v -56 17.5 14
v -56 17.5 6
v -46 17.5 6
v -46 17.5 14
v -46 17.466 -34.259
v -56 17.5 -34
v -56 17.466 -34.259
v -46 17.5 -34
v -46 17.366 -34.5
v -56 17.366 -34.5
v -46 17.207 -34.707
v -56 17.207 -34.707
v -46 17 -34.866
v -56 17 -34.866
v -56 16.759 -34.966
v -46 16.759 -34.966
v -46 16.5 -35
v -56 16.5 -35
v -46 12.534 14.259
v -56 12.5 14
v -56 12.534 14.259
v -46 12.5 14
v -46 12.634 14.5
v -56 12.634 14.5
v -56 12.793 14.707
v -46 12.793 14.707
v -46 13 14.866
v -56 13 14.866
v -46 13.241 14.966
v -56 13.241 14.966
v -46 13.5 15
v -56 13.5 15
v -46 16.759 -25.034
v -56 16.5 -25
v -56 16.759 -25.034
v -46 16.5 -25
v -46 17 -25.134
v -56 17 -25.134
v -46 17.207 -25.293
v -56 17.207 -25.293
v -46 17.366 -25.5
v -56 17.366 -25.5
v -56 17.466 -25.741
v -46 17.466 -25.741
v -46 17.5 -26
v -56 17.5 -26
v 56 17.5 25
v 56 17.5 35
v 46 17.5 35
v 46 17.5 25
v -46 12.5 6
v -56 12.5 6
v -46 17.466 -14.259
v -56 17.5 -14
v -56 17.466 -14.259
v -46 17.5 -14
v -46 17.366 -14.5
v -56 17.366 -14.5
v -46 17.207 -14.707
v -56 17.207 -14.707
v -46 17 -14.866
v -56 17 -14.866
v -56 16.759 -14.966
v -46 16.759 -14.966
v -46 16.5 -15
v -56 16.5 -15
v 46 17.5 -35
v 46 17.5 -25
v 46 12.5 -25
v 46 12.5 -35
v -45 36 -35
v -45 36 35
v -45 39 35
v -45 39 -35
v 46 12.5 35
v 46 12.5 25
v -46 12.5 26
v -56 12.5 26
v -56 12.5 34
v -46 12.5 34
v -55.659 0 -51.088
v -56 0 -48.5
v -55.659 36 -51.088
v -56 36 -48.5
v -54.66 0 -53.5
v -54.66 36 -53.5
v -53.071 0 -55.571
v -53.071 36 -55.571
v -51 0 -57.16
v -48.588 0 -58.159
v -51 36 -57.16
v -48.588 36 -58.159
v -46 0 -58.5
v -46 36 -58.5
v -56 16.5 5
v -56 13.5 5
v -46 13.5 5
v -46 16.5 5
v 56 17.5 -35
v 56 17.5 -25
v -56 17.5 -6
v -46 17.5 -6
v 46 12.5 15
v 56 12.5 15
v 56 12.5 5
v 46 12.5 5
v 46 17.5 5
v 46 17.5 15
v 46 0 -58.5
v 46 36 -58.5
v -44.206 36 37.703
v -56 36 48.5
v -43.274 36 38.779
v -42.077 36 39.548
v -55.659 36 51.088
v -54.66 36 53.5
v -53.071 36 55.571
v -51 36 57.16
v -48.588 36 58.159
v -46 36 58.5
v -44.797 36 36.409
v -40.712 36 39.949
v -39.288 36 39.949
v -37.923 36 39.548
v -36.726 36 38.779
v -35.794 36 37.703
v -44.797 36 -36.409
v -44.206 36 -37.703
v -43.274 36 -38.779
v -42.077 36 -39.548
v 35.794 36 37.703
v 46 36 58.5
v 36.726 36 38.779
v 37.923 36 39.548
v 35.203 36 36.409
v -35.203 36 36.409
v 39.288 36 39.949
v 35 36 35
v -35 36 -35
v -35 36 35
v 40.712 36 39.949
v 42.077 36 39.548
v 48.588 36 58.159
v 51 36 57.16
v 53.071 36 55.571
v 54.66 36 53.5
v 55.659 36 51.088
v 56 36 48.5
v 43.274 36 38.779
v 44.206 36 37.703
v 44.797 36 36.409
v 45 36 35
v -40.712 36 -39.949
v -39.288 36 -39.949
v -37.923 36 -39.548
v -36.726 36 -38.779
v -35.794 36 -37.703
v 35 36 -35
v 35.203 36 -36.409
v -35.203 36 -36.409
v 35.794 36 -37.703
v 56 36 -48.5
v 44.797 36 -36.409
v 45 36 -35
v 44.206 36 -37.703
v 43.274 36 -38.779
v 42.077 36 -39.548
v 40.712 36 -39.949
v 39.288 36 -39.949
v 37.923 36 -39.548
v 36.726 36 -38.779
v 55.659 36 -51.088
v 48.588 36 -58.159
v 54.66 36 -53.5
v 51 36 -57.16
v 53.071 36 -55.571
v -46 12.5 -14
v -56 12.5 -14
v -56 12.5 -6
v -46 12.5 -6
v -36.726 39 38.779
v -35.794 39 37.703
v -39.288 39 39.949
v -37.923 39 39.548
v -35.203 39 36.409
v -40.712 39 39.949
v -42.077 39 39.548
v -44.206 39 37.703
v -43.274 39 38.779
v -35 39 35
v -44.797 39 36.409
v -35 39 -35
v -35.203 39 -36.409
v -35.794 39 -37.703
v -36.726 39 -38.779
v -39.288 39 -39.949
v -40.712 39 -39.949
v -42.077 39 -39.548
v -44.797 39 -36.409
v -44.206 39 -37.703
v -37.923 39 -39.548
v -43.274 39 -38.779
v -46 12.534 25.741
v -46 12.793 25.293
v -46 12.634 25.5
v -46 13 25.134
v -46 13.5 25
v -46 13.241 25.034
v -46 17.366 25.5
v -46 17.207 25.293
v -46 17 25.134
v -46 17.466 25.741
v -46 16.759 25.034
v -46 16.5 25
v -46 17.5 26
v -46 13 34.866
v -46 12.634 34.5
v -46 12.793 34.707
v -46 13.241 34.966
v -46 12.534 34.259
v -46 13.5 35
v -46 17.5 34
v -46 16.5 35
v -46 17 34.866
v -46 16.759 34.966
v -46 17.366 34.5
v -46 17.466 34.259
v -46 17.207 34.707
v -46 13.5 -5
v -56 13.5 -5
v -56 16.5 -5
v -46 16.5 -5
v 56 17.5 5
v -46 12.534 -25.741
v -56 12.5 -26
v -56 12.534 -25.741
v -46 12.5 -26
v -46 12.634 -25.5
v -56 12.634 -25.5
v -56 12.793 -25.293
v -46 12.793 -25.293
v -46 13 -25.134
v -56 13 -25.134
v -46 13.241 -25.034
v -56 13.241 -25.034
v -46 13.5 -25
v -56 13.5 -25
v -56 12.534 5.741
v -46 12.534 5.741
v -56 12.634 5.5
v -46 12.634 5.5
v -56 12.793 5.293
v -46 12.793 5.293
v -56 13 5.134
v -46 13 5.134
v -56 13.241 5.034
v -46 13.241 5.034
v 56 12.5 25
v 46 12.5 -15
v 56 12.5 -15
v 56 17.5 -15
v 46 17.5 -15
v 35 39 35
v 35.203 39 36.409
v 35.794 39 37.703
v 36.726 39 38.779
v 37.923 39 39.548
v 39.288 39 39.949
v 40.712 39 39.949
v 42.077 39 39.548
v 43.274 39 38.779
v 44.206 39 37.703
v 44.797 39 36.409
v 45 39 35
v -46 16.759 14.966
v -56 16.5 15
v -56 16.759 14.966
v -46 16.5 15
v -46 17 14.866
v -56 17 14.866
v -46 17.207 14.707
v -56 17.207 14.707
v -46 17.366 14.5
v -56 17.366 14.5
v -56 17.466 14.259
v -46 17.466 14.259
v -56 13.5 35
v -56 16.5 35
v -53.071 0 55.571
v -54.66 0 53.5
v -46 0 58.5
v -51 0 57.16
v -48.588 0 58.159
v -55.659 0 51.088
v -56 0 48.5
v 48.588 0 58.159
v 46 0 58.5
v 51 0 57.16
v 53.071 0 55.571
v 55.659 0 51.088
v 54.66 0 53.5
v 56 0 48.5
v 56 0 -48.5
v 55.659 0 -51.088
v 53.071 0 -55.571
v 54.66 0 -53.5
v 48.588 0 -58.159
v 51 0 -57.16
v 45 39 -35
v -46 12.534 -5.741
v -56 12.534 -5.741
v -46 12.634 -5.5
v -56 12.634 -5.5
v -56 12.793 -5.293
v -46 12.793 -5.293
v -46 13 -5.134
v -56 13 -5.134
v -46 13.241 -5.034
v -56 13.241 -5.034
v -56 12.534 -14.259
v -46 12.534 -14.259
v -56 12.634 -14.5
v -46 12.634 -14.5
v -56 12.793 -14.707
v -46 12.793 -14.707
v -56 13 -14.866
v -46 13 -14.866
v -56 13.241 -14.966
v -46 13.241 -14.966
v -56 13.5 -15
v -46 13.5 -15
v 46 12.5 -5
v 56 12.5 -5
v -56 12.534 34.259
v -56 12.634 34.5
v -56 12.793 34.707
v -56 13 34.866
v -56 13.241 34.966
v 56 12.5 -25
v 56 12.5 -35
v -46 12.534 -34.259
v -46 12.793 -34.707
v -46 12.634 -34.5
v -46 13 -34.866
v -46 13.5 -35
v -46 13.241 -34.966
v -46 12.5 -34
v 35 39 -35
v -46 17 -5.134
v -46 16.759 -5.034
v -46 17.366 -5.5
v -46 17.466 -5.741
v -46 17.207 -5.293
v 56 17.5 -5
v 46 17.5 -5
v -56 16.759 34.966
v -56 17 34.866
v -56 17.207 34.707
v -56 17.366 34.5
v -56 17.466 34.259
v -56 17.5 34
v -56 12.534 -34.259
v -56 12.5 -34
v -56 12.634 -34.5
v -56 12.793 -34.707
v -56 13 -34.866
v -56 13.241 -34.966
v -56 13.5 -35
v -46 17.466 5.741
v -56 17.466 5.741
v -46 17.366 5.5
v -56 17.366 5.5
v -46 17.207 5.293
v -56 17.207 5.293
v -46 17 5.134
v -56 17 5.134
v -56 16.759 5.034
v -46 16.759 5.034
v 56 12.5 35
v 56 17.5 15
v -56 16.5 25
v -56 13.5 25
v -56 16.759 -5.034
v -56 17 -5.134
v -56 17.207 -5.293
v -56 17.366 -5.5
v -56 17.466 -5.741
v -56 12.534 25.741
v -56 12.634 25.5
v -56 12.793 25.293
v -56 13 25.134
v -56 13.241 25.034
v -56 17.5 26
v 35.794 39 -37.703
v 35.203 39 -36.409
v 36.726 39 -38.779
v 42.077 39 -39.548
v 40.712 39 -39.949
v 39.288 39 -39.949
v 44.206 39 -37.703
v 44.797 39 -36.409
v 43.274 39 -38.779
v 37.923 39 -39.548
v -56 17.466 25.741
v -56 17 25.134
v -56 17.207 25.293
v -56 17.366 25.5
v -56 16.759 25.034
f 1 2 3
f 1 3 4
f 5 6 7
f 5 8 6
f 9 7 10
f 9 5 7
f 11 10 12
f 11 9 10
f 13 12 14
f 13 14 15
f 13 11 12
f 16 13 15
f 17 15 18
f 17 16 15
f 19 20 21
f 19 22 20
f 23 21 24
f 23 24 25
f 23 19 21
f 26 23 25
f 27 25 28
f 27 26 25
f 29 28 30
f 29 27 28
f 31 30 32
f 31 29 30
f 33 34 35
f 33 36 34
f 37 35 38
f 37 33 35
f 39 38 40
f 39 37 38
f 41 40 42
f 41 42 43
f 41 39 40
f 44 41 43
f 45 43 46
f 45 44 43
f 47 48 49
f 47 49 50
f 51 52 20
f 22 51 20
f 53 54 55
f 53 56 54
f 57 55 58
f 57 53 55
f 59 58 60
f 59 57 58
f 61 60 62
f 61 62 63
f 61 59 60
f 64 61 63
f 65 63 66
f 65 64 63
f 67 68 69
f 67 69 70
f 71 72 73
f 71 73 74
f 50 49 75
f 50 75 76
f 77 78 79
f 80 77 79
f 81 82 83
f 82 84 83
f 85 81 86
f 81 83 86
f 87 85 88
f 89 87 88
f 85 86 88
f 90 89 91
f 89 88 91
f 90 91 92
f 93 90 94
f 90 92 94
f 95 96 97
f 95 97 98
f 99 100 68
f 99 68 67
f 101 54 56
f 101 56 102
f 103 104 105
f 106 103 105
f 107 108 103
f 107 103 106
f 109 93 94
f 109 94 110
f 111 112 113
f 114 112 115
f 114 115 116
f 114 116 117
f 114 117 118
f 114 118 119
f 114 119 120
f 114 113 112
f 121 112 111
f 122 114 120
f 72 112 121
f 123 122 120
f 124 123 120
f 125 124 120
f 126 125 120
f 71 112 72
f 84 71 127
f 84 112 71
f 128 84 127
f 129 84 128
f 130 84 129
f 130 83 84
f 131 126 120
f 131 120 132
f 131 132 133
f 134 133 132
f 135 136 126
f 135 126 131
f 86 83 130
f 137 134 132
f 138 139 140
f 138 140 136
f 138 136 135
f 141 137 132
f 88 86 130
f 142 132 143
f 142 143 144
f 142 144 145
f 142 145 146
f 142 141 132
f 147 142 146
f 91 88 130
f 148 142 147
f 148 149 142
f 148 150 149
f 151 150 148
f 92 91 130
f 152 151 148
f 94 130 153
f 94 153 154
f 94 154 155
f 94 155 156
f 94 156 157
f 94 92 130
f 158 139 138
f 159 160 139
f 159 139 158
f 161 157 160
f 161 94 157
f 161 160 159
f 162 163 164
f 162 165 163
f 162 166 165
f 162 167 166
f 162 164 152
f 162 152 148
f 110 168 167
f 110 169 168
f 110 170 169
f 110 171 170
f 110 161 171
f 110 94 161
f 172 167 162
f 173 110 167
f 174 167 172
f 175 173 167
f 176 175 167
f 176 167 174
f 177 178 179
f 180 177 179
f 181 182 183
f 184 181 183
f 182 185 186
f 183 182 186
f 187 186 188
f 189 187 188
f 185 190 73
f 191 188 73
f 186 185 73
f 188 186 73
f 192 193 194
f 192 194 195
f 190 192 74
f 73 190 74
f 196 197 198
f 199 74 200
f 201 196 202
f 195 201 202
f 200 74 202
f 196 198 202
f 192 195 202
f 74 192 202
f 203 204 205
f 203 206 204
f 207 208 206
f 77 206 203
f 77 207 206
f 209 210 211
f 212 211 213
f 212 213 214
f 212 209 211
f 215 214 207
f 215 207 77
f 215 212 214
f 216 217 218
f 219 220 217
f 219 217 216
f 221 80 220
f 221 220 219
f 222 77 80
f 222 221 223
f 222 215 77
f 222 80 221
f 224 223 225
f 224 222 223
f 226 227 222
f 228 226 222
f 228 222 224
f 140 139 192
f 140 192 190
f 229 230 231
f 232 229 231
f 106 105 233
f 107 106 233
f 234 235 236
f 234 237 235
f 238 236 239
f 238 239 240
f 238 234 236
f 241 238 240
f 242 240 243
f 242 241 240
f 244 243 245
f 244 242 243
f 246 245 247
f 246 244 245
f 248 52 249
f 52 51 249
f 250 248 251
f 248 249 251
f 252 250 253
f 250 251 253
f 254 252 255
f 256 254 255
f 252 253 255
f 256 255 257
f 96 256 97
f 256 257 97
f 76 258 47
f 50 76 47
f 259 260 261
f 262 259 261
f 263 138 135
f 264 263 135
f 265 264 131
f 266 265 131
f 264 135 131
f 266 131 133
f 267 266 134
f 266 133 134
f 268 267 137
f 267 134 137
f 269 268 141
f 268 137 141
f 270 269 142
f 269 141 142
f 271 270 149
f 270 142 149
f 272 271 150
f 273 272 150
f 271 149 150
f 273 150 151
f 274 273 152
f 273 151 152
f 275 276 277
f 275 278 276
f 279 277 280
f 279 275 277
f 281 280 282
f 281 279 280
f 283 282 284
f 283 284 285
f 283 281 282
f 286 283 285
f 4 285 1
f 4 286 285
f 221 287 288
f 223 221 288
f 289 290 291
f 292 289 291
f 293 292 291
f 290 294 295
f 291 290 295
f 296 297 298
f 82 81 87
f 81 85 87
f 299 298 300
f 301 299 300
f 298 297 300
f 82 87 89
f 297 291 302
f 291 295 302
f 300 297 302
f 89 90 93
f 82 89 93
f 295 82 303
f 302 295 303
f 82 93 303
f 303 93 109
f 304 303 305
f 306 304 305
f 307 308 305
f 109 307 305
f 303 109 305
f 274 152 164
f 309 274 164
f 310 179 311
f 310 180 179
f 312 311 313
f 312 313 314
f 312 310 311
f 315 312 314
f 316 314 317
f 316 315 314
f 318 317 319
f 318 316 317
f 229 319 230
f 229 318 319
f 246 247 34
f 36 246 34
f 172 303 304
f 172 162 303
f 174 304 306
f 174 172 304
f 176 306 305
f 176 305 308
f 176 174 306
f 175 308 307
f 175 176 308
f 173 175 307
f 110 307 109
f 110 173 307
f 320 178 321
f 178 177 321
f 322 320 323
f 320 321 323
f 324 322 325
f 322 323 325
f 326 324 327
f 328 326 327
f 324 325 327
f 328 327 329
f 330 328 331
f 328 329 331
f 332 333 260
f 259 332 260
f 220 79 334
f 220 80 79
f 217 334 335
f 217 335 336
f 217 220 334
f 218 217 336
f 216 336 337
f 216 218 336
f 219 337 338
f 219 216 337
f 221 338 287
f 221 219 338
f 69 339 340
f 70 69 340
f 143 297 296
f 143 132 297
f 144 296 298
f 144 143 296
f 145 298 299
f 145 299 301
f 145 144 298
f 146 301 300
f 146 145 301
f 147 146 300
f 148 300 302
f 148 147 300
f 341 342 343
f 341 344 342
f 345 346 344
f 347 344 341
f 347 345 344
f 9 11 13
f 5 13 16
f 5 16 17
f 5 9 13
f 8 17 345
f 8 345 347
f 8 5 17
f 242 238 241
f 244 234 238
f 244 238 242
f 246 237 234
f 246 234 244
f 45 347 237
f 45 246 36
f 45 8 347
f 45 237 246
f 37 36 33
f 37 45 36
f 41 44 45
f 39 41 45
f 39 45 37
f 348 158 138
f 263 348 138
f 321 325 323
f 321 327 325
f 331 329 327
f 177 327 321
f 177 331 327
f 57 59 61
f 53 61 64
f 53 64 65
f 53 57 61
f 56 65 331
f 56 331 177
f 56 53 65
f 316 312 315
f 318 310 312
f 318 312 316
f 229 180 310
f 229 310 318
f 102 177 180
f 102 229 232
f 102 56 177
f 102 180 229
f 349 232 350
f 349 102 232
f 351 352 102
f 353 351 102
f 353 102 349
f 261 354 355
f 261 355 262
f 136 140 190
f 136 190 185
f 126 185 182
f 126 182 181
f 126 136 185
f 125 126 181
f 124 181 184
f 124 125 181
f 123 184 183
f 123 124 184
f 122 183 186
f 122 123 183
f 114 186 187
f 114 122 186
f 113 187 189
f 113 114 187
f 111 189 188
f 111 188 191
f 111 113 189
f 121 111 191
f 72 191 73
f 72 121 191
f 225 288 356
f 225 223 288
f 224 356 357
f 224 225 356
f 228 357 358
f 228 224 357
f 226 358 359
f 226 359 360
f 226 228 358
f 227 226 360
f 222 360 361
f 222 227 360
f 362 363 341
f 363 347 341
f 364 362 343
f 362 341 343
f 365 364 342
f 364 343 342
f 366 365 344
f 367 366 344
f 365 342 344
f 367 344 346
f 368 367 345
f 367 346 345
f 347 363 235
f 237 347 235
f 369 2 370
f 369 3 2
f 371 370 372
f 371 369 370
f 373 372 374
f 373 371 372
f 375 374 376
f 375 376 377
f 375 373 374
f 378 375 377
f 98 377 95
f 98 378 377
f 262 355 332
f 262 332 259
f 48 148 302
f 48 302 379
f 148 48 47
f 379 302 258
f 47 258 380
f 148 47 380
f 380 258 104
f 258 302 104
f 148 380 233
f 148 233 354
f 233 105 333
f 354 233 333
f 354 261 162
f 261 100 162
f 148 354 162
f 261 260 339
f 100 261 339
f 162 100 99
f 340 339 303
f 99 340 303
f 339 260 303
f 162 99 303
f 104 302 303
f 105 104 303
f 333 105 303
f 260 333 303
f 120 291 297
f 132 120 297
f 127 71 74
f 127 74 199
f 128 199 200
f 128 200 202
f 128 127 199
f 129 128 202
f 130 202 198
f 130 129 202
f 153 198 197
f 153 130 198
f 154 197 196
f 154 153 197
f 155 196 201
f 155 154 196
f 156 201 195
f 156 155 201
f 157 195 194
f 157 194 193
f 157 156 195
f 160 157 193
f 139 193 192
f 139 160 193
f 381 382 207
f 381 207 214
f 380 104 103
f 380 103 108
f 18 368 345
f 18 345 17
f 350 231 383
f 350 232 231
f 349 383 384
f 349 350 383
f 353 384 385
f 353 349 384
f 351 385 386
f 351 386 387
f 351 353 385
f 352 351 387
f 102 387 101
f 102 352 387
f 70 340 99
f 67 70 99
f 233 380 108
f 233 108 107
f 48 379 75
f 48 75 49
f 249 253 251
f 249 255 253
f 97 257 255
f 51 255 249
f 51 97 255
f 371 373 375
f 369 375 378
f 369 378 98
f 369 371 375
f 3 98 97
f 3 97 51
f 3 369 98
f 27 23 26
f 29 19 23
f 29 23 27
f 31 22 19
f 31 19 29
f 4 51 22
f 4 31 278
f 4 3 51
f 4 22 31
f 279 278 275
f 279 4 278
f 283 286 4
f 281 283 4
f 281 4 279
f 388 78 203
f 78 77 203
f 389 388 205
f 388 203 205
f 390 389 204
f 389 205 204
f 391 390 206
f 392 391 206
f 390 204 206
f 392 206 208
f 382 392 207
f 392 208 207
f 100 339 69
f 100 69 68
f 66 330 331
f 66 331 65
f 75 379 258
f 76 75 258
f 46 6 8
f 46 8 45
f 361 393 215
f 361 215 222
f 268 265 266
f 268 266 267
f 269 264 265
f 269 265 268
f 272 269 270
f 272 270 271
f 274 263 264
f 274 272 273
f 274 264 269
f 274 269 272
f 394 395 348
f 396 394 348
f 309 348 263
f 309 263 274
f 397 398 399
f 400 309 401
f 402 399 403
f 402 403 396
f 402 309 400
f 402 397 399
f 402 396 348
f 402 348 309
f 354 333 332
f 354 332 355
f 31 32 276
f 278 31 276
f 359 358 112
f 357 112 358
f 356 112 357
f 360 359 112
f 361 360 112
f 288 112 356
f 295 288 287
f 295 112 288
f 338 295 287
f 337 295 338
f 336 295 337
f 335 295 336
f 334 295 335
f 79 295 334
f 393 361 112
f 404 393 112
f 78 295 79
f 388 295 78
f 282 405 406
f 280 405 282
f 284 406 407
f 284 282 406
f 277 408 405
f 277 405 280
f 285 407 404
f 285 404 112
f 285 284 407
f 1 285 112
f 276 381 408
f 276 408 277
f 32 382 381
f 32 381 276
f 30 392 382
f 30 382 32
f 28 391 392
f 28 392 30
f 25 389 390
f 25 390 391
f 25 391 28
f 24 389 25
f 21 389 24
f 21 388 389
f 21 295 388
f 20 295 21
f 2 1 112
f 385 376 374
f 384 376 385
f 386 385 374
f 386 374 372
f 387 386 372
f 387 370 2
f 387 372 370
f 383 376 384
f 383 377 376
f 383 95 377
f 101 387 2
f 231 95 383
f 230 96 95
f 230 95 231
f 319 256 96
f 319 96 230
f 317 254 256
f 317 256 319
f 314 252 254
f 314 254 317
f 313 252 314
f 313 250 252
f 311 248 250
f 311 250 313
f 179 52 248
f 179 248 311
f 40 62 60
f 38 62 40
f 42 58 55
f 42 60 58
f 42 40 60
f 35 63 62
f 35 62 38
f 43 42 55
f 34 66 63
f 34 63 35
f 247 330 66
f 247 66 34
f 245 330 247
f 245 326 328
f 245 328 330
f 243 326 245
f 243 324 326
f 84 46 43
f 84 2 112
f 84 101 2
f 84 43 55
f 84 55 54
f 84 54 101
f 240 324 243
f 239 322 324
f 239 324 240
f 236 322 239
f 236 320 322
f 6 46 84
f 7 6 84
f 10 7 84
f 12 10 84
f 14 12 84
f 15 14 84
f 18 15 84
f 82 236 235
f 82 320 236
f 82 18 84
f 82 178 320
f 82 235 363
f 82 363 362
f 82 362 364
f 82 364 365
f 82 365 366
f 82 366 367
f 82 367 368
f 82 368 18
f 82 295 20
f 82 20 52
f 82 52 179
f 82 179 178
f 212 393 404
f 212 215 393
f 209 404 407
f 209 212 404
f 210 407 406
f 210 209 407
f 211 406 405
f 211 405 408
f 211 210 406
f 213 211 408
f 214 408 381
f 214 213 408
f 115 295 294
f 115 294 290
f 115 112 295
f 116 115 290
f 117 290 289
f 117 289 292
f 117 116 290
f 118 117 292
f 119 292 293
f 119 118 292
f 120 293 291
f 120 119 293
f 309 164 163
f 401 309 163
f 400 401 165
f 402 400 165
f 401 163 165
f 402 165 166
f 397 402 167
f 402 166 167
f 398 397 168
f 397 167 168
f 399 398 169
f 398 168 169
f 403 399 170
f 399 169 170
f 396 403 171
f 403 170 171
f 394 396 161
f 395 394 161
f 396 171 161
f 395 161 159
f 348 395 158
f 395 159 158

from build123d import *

# Parameters (mm, degrees)
SKETCH_1_W          = 112
SKETCH_1_H          = 117
EXTRUDE_1_DEPTH     = 36
FILLET_1_R          = 10
EXTRUDE_2_DEPTH     = 3
SKETCH_4_W          = 10
SKETCH_4_H          = 5
CUT_EXTRUDE_1_DEPTH = 10
FILLET_2_R          = 1
SKETCH_5_W          = 10
SKETCH_5_H          = 5
CUT_EXTRUDE_2_DEPTH = 10


with BuildPart() as part:
    # 草图1 → 凸台-拉伸1 (new body)
    with BuildSketch(Plane(origin=(0, 0, 0), x_dir=(1, 0, 0), z_dir=(0, 1, 0))):
        Rectangle(SKETCH_1_W, SKETCH_1_H)
    extrude(amount=EXTRUDE_1_DEPTH)

    # 圆角1
    fillet_1_edges = [part.edges().sort_by_distance(p)[0] for p in [
        (56, 18, 58.5),
        (-56, 18, 58.5),
        (-56, 18, -58.5),
        (56, 18, -58.5),
    ]]
    fillet(fillet_1_edges, radius=FILLET_1_R)

    # 草图3 → 凸台-拉伸2 (add)
    with BuildSketch(Plane(origin=(0, 36, 0), x_dir=(1, 0, 0), z_dir=(0, 1, 0))):
        with BuildLine():
            Line((-35, 35), (-35, -35))
            ThreePointArc((-35, -35), (-40, -40), (-45, -35))
            Line((-45, -35), (-45, 35))
            ThreePointArc((-45, 35), (-40, 40), (-35, 35))
        make_face()
        with BuildLine():
            Line((35, 35), (35, -35))
            ThreePointArc((35, -35), (40, -40), (45, -35))
            Line((45, -35), (45, 35))
            ThreePointArc((45, 35), (40, 40), (35, 35))
        make_face()
    extrude(amount=EXTRUDE_2_DEPTH)

    # 草图4 → 切除-拉伸1 (cut)
    with BuildSketch(Plane.ZY.offset(56)):
        with Locations((-10, 15)):
            Rectangle(SKETCH_4_W, SKETCH_4_H)
        with Locations((-30, 15)):
            Rectangle(SKETCH_4_W, SKETCH_4_H)
        with Locations((10, 15)):
            Rectangle(SKETCH_4_W, SKETCH_4_H)
        with Locations((30, 15)):
            Rectangle(SKETCH_4_W, SKETCH_4_H)
    extrude(amount=-CUT_EXTRUDE_1_DEPTH, mode=Mode.SUBTRACT)

    # 圆角2
    fillet_2_edges = [part.edges().sort_by_distance(p)[0] for p in [
        (-51, 12.5, -35),
        (-51, 17.5, -35),
        (-51, 17.5, -25),
        (-51, 12.5, -25),
        (-51, 17.5, -15),
        (-51, 17.5, -5),
        (-51, 12.5, -5),
        (-51, 12.5, -15),
        (-51, 17.5, 5),
        (-51, 17.5, 15),
        (-51, 12.5, 15),
        (-51, 12.5, 5),
        (-51, 17.5, 25),
        (-51, 17.5, 35),
        (-51, 12.5, 35),
        (-51, 12.5, 25),
    ]]
    fillet(fillet_2_edges, radius=FILLET_2_R)

    # 草图5 → 切除-拉伸2 (cut)
    with BuildSketch(Plane(origin=(56, 0, 0), x_dir=(0, 0, -1), z_dir=(1, 0, 0))):
        with Locations((-10, 15)):
            Rectangle(SKETCH_5_W, SKETCH_5_H)
        with Locations((-30, 15)):
            Rectangle(SKETCH_5_W, SKETCH_5_H)
        with Locations((10, 15)):
            Rectangle(SKETCH_5_W, SKETCH_5_H)
        with Locations((30, 15)):
            Rectangle(SKETCH_5_W, SKETCH_5_H)
    extrude(amount=-CUT_EXTRUDE_2_DEPTH, mode=Mode.SUBTRACT)


solid = part.part
